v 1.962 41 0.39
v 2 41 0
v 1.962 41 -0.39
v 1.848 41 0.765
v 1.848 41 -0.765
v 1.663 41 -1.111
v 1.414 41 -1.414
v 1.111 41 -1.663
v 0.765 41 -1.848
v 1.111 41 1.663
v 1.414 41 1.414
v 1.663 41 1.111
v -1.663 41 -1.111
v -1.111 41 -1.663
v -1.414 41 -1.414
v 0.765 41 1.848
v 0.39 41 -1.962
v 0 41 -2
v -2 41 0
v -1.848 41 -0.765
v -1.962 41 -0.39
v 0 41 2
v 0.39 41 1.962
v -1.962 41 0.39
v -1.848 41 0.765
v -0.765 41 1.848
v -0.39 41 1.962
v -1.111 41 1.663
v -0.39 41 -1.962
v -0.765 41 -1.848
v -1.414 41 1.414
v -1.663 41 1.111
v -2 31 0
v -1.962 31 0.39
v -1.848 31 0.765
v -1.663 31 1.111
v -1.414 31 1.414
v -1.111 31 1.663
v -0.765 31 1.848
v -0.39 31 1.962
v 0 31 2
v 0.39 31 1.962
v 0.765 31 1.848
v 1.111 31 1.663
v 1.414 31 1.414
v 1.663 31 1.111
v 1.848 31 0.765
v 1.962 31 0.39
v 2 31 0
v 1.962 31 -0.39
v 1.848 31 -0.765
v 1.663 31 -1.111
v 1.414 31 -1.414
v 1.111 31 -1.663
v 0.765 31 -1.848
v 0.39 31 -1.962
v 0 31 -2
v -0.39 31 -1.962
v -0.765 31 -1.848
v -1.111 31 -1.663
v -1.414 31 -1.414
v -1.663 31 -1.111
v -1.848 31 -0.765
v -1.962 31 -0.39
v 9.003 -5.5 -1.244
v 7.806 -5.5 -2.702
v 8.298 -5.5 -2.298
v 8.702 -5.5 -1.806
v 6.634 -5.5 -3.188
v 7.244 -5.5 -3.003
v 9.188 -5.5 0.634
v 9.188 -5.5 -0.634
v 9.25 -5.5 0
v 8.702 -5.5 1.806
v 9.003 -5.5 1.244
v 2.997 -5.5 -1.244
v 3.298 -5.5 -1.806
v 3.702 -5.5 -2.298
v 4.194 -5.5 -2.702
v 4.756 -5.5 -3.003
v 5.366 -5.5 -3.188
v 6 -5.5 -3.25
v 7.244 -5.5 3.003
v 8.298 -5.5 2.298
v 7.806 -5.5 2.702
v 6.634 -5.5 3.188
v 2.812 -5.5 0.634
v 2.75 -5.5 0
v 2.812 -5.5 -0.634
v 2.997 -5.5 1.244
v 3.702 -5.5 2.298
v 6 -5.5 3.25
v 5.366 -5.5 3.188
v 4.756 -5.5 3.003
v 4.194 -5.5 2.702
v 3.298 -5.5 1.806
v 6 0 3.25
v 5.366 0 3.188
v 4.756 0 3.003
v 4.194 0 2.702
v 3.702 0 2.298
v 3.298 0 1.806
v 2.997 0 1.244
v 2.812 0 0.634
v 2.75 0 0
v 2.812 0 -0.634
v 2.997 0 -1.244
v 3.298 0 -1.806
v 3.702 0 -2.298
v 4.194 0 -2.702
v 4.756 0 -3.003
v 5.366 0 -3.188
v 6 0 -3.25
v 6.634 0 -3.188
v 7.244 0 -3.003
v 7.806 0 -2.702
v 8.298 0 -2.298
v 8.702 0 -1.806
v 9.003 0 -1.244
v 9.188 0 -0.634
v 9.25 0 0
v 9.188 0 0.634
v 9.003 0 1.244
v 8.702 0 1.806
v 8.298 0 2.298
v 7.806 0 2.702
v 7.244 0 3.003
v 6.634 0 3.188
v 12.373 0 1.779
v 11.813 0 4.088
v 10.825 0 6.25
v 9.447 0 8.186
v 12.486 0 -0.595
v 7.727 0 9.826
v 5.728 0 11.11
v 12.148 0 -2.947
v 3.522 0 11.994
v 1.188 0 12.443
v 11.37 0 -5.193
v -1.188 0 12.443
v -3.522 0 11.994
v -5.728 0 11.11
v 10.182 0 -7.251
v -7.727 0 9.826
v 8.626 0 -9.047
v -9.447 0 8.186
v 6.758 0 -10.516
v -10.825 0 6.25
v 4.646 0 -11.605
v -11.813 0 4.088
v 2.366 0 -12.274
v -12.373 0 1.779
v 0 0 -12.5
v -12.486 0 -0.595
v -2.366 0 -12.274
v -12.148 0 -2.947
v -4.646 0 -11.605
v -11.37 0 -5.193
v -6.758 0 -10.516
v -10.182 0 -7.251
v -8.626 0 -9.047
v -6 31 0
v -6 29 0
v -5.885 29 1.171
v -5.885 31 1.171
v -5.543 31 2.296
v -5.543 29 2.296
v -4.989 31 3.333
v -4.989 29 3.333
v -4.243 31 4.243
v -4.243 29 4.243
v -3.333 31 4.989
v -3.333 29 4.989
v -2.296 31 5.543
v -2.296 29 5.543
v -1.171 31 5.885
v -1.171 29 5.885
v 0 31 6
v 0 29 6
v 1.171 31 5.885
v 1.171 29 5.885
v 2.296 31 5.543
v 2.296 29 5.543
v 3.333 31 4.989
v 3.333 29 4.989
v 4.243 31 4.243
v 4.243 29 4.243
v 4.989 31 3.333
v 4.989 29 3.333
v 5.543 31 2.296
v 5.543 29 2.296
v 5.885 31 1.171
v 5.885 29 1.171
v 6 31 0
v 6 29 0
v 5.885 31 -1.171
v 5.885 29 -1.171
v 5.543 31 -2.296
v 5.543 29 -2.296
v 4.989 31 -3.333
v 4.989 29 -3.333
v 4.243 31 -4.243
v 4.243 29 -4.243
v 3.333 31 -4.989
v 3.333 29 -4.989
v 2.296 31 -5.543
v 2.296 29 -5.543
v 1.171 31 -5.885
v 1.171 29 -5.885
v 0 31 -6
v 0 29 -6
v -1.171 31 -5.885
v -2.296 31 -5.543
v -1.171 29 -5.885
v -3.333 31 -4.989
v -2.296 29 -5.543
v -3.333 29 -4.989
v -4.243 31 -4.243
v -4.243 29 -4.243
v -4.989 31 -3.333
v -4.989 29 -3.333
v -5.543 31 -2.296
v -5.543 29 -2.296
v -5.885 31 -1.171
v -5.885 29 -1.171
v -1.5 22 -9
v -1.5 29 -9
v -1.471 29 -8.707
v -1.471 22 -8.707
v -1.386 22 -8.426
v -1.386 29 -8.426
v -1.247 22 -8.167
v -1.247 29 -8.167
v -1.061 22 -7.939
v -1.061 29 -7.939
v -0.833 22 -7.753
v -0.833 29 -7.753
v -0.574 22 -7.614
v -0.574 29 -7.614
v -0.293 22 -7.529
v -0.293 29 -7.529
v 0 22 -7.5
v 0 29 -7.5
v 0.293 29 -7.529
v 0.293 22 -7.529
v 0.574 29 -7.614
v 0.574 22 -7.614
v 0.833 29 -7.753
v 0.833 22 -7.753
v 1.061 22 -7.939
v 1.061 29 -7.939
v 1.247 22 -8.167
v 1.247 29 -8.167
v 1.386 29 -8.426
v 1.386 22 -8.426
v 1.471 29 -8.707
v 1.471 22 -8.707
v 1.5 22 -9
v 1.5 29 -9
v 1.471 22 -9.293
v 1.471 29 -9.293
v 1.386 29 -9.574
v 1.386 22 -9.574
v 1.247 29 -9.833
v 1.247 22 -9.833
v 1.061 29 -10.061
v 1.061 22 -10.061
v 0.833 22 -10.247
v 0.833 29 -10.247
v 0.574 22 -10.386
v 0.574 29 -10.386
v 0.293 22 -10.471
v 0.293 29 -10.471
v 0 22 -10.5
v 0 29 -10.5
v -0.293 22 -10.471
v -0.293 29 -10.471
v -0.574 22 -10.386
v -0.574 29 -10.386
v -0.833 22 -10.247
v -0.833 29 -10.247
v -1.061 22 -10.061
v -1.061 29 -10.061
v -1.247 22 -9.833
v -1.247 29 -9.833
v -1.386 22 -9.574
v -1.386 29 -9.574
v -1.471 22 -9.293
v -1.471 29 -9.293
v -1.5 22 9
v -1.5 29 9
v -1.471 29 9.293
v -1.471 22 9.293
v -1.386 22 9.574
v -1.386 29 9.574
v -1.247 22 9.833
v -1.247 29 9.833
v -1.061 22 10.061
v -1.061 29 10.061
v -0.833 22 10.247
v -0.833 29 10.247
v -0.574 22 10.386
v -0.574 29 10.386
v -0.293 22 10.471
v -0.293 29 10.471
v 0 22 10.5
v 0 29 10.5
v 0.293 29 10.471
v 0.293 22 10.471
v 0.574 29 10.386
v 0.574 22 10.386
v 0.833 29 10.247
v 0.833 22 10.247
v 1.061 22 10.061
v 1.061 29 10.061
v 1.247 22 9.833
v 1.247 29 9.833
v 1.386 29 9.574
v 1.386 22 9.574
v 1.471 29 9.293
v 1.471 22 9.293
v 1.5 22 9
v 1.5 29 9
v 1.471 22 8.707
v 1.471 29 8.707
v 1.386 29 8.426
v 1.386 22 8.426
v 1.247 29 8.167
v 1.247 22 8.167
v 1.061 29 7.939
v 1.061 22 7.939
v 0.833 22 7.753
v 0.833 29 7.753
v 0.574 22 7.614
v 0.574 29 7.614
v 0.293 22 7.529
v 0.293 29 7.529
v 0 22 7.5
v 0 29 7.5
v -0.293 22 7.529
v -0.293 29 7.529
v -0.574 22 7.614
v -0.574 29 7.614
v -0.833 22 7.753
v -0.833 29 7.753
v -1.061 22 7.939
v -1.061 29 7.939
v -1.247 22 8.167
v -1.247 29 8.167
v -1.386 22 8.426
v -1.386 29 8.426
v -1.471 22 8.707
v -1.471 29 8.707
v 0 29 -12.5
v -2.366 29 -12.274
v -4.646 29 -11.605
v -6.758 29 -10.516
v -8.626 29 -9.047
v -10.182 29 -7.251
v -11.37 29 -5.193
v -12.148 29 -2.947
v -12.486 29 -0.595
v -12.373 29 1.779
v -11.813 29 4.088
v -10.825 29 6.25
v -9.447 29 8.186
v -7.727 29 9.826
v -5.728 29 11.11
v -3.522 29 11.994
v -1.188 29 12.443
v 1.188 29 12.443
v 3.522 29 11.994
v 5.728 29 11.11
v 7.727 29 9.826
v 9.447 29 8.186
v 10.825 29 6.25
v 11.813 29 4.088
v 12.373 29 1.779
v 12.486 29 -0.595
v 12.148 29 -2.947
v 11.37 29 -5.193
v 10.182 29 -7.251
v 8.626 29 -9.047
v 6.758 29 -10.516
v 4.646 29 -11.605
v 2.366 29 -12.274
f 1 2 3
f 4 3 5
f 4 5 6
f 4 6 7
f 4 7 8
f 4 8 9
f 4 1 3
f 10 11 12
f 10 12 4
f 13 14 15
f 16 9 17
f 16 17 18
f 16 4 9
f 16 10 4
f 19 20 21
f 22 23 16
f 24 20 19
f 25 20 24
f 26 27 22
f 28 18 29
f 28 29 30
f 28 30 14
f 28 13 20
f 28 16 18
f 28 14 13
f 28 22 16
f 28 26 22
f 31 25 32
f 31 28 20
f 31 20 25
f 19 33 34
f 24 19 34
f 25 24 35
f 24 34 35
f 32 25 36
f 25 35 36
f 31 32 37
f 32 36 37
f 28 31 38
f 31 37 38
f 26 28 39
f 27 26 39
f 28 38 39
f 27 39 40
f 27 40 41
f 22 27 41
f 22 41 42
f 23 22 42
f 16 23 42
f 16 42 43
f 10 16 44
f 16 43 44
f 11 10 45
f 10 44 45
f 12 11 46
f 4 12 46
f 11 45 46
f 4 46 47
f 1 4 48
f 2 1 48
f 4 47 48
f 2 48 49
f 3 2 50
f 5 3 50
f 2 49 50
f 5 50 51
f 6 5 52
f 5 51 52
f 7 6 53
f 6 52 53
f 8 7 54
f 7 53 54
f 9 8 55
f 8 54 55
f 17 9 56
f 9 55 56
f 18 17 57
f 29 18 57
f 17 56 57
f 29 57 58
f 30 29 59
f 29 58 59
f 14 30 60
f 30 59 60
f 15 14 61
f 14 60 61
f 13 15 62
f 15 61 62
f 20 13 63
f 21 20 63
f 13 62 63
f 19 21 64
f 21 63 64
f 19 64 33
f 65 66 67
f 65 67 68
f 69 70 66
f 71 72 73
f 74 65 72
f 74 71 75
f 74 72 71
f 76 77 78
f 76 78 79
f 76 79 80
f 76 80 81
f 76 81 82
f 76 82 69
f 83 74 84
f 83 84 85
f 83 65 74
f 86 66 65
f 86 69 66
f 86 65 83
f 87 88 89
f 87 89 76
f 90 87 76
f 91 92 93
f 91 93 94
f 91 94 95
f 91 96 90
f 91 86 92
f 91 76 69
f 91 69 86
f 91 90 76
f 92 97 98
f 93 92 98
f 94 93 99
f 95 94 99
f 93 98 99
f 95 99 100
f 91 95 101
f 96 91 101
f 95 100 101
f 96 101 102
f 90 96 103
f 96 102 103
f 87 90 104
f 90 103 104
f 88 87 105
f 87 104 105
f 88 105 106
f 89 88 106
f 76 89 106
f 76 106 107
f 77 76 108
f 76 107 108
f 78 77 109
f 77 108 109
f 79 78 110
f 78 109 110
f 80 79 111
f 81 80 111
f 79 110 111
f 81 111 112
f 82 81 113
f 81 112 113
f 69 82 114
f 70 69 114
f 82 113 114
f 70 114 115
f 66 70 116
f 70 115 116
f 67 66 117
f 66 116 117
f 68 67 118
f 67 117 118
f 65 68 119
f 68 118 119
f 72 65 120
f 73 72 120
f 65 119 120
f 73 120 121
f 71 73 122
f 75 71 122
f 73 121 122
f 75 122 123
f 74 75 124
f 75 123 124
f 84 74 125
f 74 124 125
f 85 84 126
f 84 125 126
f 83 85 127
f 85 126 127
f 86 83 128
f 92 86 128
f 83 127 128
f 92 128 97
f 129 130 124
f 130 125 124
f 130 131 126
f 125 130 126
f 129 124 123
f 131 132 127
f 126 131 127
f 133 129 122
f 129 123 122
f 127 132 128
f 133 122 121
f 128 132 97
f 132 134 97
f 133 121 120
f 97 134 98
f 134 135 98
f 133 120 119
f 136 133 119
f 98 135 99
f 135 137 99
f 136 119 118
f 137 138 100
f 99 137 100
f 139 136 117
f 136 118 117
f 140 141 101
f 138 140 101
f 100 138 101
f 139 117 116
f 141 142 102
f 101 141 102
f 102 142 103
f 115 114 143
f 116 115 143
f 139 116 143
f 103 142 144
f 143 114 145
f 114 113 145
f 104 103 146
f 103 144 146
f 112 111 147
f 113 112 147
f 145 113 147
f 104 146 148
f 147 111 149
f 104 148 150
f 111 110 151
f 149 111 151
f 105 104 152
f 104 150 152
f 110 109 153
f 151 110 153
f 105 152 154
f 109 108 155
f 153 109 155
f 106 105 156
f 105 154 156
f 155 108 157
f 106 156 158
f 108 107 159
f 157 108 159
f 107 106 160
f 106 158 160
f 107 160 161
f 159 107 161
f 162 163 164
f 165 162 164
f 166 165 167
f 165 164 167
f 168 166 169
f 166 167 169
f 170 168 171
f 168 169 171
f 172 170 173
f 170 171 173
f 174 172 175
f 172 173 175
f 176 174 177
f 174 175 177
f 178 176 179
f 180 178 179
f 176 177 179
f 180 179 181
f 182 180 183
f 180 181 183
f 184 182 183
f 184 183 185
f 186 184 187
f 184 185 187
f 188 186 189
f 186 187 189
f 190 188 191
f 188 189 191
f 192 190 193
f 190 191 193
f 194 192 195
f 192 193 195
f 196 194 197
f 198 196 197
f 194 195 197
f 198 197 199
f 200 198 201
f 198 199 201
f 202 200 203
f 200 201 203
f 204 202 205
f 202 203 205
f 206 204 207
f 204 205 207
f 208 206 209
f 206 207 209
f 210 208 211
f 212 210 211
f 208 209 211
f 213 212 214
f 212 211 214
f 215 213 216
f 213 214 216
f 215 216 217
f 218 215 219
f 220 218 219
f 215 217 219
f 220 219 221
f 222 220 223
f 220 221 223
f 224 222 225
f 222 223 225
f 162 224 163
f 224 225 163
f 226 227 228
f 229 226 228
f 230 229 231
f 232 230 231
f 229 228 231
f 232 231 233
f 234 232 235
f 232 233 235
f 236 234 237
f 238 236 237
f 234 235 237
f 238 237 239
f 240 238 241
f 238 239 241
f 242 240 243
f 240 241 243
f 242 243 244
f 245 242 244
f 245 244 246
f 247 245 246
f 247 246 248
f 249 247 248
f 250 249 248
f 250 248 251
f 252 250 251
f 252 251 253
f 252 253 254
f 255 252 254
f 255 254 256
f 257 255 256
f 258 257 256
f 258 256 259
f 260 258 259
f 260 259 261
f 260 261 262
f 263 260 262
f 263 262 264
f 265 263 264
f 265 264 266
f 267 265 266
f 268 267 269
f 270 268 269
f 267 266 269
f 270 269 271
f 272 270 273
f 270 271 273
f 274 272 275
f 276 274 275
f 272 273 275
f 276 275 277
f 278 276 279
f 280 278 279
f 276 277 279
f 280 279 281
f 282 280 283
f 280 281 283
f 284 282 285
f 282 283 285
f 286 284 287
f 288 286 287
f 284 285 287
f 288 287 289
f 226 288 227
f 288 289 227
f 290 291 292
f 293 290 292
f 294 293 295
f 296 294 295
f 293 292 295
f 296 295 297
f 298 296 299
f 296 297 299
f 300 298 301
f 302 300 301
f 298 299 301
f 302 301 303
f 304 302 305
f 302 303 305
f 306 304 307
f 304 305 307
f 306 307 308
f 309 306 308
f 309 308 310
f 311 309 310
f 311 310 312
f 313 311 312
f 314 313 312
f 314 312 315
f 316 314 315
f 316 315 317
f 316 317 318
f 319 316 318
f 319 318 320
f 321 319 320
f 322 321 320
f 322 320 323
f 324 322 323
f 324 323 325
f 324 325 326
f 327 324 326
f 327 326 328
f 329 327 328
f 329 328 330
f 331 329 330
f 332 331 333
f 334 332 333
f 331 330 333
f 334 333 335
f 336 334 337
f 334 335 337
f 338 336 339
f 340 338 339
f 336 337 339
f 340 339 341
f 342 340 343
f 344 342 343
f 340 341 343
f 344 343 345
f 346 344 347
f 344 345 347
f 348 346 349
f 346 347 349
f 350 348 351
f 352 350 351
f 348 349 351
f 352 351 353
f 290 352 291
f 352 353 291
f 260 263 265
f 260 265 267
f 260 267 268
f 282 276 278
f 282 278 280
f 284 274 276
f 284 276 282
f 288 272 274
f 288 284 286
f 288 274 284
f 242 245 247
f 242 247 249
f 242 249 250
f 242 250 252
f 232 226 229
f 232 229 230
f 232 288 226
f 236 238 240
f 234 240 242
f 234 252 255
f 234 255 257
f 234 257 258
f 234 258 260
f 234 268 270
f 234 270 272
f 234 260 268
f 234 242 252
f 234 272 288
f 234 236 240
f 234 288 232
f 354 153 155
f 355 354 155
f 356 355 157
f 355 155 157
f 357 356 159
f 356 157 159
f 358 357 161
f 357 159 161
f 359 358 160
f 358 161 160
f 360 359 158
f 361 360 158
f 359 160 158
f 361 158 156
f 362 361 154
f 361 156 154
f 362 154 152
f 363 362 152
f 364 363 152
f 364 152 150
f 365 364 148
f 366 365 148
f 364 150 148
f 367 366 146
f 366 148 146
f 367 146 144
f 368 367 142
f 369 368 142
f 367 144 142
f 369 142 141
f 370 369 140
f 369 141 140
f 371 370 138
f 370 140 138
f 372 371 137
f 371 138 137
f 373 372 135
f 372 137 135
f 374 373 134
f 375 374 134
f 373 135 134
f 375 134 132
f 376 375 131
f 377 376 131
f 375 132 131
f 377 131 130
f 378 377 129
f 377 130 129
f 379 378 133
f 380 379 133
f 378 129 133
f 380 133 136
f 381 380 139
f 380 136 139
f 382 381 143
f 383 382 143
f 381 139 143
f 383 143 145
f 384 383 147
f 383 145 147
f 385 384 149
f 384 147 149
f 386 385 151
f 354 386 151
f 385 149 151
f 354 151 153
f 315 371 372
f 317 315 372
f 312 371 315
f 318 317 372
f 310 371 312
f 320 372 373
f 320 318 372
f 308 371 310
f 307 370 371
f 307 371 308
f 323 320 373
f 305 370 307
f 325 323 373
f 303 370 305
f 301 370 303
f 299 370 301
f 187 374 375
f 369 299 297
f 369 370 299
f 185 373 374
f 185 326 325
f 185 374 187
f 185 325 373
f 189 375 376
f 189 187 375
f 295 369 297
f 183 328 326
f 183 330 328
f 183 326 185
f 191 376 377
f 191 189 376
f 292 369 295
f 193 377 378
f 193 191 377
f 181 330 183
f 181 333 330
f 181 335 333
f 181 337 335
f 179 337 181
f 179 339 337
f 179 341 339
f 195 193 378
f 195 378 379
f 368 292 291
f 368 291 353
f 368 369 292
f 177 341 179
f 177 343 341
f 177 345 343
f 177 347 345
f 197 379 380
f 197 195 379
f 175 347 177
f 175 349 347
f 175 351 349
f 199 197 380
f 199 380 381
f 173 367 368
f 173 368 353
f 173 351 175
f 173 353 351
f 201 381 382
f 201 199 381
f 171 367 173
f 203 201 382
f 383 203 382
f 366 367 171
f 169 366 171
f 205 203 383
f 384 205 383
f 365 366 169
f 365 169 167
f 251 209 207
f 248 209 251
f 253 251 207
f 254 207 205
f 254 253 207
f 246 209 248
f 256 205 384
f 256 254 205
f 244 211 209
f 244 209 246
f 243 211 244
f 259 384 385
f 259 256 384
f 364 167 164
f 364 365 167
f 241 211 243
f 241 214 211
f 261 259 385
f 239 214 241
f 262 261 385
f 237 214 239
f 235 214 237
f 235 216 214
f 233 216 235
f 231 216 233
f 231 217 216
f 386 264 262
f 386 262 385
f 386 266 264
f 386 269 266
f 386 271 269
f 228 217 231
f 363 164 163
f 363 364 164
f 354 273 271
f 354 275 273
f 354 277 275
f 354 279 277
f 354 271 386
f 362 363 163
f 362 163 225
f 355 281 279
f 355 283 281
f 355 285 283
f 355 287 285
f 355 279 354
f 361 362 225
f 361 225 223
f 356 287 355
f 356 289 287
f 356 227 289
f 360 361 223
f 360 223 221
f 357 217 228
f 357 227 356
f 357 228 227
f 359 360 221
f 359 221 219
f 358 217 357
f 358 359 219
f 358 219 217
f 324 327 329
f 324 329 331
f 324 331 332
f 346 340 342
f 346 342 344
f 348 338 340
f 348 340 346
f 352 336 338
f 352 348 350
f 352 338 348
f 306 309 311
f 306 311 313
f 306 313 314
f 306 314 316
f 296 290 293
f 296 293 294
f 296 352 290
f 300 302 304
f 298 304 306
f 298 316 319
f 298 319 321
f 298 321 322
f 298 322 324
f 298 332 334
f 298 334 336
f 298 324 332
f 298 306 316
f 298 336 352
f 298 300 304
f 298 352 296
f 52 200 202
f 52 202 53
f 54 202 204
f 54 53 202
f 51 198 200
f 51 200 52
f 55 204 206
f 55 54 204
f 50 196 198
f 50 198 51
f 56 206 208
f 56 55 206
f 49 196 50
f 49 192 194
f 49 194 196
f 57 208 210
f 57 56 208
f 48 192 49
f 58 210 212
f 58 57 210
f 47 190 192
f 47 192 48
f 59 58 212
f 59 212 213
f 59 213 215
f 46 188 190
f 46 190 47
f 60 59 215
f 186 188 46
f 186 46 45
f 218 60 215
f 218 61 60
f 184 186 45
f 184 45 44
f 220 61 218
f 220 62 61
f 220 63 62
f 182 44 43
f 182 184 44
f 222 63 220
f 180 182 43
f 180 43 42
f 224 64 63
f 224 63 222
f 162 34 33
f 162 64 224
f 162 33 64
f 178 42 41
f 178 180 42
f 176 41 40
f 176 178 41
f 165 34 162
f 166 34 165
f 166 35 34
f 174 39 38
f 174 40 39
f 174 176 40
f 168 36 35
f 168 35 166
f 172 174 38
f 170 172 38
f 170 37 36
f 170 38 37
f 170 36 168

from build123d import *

# Parameters (mm, degrees)
SKETCH_1_R          = 12.5
EXTRUDE_3_DEPTH     = 29
SKETCH_4_R          = 6
EXTRUDE_4_DEPTH     = 2
SKETCH_5_R          = 2
EXTRUDE_5_DEPTH     = 10
SKETCH_6_R          = 1.5
CUT_EXTRUDE_1_DEPTH = 19
SKETCH_7_R          = 3.25
EXTRUDE_6_DEPTH     = 5.5


with BuildPart() as part:
    # 草图1 → 凸台-拉伸3 (new body)
    with BuildSketch(Plane(origin=(0, 0, 0), x_dir=(0, 0, -1), z_dir=(0, 1, 0))):
        Circle(SKETCH_1_R)
    extrude(amount=EXTRUDE_3_DEPTH)

    # 草图4 → 凸台-拉伸4 (add)
    with BuildSketch(Plane(origin=(0, 29, 0), x_dir=(0, 0, -1), z_dir=(0, 1, 0))):
        with Locations(Location((0, 0, 0), (0, 0, 90))):
            Circle(SKETCH_4_R)
    extrude(amount=EXTRUDE_4_DEPTH)

    # 草图5 → 凸台-拉伸5 (add)
    with BuildSketch(Plane(origin=(0, 31, 0), x_dir=(0, 0, -1), z_dir=(0, 1, 0))):
        with Locations(Location((0, 0, 0), (0, 0, 90))):
            Circle(SKETCH_5_R)
    extrude(amount=EXTRUDE_5_DEPTH)

    # 草图6 → 切除-拉伸1 (cut)
    with BuildSketch(Plane(origin=(0, 41, 0), x_dir=(0, 0, -1), z_dir=(0, 1, 0))):
        with Locations(Location((-9, 0, 0), (0, 0, 90))):
            Circle(SKETCH_6_R)
        with Locations(Location((9, 0, 0), (0, 0, 90))):
            Circle(SKETCH_6_R)
    extrude(amount=-CUT_EXTRUDE_1_DEPTH, mode=Mode.SUBTRACT)

    # 草图7 → 凸台-拉伸6 (add)
    with BuildSketch(Plane(origin=(0, 0, 0), x_dir=(0, 0, 1), z_dir=(0, -1, 0))):
        with Locations((0, -6)):
            Circle(SKETCH_7_R)
    extrude(amount=EXTRUDE_6_DEPTH)


solid = part.part
